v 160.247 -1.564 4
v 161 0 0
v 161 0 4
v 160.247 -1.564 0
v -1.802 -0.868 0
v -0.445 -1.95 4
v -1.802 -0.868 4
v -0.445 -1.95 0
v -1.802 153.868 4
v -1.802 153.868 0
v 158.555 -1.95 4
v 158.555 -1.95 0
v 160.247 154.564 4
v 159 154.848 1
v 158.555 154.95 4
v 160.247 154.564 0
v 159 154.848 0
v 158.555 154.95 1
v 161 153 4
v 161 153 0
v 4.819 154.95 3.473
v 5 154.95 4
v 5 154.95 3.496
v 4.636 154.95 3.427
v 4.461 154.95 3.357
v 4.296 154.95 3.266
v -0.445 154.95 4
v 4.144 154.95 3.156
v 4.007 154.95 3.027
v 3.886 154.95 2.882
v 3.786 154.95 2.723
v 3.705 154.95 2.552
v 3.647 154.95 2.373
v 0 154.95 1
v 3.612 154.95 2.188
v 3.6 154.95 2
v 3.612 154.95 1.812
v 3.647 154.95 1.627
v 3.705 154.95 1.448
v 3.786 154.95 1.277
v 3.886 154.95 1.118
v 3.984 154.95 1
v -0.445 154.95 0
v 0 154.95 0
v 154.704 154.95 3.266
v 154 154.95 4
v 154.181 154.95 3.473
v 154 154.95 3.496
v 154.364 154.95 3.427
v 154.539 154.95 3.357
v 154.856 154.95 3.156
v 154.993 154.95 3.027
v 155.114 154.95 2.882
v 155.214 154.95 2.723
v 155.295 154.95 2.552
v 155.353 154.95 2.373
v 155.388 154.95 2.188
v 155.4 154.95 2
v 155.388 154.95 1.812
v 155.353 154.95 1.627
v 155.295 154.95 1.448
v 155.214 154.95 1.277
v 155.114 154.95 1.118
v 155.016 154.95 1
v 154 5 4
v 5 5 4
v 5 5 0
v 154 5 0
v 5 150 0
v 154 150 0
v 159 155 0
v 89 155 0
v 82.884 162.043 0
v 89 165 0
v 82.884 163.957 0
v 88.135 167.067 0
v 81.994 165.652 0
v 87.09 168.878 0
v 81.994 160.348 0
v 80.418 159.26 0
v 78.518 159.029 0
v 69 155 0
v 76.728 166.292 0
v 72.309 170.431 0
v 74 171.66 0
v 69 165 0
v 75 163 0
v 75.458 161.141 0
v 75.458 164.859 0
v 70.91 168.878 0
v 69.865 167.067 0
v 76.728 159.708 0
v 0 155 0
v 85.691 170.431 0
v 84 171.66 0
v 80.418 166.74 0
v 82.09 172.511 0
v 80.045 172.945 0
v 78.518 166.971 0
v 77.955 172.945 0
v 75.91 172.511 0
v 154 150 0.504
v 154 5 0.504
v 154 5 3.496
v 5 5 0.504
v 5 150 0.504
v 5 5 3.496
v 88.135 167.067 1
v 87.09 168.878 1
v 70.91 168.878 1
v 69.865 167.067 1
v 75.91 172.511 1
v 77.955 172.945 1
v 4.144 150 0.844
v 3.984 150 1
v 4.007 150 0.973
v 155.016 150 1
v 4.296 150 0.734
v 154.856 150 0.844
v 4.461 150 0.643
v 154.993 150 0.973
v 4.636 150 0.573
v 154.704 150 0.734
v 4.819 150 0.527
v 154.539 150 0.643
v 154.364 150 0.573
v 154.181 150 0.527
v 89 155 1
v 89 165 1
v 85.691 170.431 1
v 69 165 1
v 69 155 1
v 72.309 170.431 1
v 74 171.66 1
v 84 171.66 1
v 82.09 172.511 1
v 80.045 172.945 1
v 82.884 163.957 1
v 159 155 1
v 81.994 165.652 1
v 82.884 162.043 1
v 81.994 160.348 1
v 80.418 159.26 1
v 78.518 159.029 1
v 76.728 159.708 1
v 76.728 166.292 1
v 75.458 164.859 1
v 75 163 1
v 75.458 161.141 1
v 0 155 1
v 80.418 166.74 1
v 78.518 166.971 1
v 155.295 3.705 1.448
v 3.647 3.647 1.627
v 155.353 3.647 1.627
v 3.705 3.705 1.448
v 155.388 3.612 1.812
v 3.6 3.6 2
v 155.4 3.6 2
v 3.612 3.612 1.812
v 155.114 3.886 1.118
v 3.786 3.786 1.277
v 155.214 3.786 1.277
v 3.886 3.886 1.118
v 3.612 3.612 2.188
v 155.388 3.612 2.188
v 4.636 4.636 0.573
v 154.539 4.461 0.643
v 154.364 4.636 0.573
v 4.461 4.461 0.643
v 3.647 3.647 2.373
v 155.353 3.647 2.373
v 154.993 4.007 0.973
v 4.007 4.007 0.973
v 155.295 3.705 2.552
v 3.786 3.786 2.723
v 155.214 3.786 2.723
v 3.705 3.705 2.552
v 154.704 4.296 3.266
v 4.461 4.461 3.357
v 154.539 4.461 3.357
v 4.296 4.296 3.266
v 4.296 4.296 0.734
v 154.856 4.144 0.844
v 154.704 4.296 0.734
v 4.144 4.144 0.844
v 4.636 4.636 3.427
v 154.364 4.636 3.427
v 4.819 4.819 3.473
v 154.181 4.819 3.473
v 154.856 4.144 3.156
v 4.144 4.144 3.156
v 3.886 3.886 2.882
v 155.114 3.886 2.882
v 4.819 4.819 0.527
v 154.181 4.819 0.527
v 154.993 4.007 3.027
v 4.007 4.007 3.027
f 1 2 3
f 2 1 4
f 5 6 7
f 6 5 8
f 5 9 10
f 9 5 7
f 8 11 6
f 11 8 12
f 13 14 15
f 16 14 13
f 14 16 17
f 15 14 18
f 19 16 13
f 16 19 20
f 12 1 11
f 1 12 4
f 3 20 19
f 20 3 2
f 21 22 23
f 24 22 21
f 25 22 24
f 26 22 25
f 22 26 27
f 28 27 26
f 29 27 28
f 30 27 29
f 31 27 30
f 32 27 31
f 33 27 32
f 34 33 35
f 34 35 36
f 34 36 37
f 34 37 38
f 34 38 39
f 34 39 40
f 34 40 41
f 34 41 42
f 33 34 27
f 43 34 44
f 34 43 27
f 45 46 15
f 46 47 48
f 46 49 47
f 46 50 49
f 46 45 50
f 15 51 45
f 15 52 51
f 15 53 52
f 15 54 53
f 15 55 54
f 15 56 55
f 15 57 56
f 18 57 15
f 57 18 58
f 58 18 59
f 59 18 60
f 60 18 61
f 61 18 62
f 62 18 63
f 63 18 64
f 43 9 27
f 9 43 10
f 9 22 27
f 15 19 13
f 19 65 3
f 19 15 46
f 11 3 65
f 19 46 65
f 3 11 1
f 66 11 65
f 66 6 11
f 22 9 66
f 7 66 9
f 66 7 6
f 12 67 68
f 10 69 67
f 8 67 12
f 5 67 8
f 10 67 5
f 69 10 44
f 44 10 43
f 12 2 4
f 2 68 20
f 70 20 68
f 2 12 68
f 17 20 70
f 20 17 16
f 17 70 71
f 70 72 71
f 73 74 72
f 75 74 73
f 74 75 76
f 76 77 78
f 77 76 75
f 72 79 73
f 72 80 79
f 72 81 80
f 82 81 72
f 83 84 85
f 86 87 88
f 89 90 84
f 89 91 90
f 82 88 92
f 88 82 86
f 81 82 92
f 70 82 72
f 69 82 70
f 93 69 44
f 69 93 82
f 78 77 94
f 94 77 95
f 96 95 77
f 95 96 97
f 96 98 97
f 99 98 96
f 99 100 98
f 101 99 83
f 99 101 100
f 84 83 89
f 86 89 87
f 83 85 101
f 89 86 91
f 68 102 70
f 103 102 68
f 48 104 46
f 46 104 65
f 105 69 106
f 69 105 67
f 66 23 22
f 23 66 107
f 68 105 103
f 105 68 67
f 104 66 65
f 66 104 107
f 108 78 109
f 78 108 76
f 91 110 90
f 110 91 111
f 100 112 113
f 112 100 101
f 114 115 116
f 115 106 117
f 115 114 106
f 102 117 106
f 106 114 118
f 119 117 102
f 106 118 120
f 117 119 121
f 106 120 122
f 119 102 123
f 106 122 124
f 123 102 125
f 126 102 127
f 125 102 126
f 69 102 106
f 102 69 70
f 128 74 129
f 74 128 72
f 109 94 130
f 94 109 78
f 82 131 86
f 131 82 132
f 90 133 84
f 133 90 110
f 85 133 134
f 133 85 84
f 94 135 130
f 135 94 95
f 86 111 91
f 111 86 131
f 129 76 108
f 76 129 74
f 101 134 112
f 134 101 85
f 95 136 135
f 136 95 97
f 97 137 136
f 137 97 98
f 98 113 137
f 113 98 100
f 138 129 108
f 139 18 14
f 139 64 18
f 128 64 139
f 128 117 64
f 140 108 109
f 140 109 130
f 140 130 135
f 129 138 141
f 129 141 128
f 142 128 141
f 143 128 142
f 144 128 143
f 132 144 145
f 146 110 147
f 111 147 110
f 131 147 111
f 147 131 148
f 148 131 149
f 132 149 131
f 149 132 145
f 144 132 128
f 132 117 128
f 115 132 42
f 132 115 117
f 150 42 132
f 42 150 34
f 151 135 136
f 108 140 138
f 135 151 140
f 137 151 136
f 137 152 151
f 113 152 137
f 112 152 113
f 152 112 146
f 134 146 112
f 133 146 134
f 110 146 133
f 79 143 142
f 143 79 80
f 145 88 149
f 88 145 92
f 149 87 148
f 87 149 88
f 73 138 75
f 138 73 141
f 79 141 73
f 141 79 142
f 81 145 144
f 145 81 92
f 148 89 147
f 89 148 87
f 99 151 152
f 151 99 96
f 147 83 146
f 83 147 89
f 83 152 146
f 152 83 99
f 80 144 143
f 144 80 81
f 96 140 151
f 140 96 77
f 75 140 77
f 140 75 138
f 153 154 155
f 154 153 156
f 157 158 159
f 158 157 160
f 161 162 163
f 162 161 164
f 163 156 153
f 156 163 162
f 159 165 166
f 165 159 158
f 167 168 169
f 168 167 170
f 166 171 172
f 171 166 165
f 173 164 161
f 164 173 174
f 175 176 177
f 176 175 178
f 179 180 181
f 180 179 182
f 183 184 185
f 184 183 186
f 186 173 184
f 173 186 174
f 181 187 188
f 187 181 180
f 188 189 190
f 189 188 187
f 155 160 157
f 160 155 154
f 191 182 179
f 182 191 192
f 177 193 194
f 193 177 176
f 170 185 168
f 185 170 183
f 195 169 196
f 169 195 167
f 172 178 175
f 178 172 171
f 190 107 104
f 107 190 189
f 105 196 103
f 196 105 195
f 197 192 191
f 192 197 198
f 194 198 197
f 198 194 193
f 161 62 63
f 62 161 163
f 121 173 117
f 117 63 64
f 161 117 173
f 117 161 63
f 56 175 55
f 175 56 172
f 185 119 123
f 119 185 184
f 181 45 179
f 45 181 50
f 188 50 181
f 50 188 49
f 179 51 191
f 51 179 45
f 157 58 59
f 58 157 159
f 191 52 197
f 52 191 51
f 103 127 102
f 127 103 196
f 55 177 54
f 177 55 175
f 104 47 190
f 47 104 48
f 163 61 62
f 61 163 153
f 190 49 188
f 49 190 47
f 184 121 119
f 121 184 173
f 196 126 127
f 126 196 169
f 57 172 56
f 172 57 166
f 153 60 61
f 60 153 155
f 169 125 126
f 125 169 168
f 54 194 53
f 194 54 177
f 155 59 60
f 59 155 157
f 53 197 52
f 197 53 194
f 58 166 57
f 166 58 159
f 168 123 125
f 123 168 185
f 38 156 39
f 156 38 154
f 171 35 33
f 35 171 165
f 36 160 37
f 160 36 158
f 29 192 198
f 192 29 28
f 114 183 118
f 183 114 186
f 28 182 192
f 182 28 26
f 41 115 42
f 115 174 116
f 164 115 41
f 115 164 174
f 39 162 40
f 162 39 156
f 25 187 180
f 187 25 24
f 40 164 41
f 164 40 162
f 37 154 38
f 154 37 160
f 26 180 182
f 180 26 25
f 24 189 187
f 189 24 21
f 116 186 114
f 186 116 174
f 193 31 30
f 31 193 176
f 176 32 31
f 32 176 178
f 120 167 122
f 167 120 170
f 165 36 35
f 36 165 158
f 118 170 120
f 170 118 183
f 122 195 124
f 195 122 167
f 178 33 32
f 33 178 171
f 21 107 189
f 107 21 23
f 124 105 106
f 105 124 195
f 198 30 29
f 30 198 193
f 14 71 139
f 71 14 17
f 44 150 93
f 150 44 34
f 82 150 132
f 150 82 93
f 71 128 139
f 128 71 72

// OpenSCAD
/********************************************************************************************************
P-Plate and L-Plate Holder v1.0 by Mike Thompson 3/1/2015, Thingiverse: mike_linus

The Plate Holder is designed to hold the standard 150mm x 150mm Australian L or P plates. 

The key advantage is the ability to slide the plate in and out without having to remove the mounting mechanism.  This is particularly handy when frequently changing plates between drivers.

The attachment locations and hole size are customisable for various suction cup or hook sizes and placements.
********************************************************************************************************/

/**************************************************************************
Enter the values corresponding to your tray requirements in this section
***************************************************************************/

/* [Attachment Options] */


//The radius of the attachment hole
sucker_hole_radius=4;
//Top Attachment
tsucker="include";//[include,exclude]
//Left Attachment
lsucker="exclude";//[include,exclude]
//Right Attachment
rsucker="exclude";//[include,exclude]
//Bottom Attachment
bsucker="exclude";//[include,exclude]

module holder()
{
	difference()
	{
		hull()
		{
			cylinder(r=2, h=4);
			translate([159,0,0])cylinder(r=2, h=4);
			translate([0,153,0])cylinder(r=2, h=4);
			translate([159,153,0])cylinder(r=2, h=4);
		}
		translate([5,5,0])cube([149,151,6]);	
	}
}

module sucker()
{
	difference()
	{	
		hull()
		{
			cylinder(r=10,h=1);
			translate([-10,-2,0])cube([20,15,1]);
		}
		cylinder(r=sucker_hole_radius,h=1);
	}
}

module slots()
{
	translate([5.1,158,2])rotate([90,180,0])cylinder(r=1.5,h=153,$fn=50);
	translate([5,5.1,2])rotate([0,90,0])rotate([0,0,-90])cylinder(r=1.5,h=149,$fn=50);
	translate([153.9,158,2])mirror(0,0,1)rotate([90,180,0])cylinder(r=1.5,h=153,$fn=50);
	intersection()
	{
		translate([4,5.1,2])rotate([0,90,0])rotate([0,0,-90])cylinder(r=1.5,h=152,$fn=50);
		translate([153.9,156,2])mirror(0,0,1)rotate([90,180,0])cylinder(r=1.5,h=153,$fn=50);
	}
	intersection()
	{
		translate([5.1,155,2])rotate([90,180,0])cylinder(r=1.5,h=152,$fn=50);
		translate([3,5.1,2])rotate([0,90,0])rotate([0,0,-90])cylinder(r=1.5,h=153,$fn=50);
	}

}

module build()
{
	difference()
	{
		union()
		{
			holder();
			if (bsucker=="include")
			{
				translate([79,-10,0])sucker();
			}
			if (rsucker=="include")
			{
				translate([169,141,0])rotate([0,0,90])sucker();
			}
			if (lsucker=="include")
			{
				translate([-10,141,0])rotate([0,0,-90])sucker();
			}
			if (tsucker=="include")
			{
				translate([79,163,0])rotate([0,0,180])sucker();
			}
		}
		slots();
	}
	translate([0,150,0])cube([159,5,1]);	
}

build();
